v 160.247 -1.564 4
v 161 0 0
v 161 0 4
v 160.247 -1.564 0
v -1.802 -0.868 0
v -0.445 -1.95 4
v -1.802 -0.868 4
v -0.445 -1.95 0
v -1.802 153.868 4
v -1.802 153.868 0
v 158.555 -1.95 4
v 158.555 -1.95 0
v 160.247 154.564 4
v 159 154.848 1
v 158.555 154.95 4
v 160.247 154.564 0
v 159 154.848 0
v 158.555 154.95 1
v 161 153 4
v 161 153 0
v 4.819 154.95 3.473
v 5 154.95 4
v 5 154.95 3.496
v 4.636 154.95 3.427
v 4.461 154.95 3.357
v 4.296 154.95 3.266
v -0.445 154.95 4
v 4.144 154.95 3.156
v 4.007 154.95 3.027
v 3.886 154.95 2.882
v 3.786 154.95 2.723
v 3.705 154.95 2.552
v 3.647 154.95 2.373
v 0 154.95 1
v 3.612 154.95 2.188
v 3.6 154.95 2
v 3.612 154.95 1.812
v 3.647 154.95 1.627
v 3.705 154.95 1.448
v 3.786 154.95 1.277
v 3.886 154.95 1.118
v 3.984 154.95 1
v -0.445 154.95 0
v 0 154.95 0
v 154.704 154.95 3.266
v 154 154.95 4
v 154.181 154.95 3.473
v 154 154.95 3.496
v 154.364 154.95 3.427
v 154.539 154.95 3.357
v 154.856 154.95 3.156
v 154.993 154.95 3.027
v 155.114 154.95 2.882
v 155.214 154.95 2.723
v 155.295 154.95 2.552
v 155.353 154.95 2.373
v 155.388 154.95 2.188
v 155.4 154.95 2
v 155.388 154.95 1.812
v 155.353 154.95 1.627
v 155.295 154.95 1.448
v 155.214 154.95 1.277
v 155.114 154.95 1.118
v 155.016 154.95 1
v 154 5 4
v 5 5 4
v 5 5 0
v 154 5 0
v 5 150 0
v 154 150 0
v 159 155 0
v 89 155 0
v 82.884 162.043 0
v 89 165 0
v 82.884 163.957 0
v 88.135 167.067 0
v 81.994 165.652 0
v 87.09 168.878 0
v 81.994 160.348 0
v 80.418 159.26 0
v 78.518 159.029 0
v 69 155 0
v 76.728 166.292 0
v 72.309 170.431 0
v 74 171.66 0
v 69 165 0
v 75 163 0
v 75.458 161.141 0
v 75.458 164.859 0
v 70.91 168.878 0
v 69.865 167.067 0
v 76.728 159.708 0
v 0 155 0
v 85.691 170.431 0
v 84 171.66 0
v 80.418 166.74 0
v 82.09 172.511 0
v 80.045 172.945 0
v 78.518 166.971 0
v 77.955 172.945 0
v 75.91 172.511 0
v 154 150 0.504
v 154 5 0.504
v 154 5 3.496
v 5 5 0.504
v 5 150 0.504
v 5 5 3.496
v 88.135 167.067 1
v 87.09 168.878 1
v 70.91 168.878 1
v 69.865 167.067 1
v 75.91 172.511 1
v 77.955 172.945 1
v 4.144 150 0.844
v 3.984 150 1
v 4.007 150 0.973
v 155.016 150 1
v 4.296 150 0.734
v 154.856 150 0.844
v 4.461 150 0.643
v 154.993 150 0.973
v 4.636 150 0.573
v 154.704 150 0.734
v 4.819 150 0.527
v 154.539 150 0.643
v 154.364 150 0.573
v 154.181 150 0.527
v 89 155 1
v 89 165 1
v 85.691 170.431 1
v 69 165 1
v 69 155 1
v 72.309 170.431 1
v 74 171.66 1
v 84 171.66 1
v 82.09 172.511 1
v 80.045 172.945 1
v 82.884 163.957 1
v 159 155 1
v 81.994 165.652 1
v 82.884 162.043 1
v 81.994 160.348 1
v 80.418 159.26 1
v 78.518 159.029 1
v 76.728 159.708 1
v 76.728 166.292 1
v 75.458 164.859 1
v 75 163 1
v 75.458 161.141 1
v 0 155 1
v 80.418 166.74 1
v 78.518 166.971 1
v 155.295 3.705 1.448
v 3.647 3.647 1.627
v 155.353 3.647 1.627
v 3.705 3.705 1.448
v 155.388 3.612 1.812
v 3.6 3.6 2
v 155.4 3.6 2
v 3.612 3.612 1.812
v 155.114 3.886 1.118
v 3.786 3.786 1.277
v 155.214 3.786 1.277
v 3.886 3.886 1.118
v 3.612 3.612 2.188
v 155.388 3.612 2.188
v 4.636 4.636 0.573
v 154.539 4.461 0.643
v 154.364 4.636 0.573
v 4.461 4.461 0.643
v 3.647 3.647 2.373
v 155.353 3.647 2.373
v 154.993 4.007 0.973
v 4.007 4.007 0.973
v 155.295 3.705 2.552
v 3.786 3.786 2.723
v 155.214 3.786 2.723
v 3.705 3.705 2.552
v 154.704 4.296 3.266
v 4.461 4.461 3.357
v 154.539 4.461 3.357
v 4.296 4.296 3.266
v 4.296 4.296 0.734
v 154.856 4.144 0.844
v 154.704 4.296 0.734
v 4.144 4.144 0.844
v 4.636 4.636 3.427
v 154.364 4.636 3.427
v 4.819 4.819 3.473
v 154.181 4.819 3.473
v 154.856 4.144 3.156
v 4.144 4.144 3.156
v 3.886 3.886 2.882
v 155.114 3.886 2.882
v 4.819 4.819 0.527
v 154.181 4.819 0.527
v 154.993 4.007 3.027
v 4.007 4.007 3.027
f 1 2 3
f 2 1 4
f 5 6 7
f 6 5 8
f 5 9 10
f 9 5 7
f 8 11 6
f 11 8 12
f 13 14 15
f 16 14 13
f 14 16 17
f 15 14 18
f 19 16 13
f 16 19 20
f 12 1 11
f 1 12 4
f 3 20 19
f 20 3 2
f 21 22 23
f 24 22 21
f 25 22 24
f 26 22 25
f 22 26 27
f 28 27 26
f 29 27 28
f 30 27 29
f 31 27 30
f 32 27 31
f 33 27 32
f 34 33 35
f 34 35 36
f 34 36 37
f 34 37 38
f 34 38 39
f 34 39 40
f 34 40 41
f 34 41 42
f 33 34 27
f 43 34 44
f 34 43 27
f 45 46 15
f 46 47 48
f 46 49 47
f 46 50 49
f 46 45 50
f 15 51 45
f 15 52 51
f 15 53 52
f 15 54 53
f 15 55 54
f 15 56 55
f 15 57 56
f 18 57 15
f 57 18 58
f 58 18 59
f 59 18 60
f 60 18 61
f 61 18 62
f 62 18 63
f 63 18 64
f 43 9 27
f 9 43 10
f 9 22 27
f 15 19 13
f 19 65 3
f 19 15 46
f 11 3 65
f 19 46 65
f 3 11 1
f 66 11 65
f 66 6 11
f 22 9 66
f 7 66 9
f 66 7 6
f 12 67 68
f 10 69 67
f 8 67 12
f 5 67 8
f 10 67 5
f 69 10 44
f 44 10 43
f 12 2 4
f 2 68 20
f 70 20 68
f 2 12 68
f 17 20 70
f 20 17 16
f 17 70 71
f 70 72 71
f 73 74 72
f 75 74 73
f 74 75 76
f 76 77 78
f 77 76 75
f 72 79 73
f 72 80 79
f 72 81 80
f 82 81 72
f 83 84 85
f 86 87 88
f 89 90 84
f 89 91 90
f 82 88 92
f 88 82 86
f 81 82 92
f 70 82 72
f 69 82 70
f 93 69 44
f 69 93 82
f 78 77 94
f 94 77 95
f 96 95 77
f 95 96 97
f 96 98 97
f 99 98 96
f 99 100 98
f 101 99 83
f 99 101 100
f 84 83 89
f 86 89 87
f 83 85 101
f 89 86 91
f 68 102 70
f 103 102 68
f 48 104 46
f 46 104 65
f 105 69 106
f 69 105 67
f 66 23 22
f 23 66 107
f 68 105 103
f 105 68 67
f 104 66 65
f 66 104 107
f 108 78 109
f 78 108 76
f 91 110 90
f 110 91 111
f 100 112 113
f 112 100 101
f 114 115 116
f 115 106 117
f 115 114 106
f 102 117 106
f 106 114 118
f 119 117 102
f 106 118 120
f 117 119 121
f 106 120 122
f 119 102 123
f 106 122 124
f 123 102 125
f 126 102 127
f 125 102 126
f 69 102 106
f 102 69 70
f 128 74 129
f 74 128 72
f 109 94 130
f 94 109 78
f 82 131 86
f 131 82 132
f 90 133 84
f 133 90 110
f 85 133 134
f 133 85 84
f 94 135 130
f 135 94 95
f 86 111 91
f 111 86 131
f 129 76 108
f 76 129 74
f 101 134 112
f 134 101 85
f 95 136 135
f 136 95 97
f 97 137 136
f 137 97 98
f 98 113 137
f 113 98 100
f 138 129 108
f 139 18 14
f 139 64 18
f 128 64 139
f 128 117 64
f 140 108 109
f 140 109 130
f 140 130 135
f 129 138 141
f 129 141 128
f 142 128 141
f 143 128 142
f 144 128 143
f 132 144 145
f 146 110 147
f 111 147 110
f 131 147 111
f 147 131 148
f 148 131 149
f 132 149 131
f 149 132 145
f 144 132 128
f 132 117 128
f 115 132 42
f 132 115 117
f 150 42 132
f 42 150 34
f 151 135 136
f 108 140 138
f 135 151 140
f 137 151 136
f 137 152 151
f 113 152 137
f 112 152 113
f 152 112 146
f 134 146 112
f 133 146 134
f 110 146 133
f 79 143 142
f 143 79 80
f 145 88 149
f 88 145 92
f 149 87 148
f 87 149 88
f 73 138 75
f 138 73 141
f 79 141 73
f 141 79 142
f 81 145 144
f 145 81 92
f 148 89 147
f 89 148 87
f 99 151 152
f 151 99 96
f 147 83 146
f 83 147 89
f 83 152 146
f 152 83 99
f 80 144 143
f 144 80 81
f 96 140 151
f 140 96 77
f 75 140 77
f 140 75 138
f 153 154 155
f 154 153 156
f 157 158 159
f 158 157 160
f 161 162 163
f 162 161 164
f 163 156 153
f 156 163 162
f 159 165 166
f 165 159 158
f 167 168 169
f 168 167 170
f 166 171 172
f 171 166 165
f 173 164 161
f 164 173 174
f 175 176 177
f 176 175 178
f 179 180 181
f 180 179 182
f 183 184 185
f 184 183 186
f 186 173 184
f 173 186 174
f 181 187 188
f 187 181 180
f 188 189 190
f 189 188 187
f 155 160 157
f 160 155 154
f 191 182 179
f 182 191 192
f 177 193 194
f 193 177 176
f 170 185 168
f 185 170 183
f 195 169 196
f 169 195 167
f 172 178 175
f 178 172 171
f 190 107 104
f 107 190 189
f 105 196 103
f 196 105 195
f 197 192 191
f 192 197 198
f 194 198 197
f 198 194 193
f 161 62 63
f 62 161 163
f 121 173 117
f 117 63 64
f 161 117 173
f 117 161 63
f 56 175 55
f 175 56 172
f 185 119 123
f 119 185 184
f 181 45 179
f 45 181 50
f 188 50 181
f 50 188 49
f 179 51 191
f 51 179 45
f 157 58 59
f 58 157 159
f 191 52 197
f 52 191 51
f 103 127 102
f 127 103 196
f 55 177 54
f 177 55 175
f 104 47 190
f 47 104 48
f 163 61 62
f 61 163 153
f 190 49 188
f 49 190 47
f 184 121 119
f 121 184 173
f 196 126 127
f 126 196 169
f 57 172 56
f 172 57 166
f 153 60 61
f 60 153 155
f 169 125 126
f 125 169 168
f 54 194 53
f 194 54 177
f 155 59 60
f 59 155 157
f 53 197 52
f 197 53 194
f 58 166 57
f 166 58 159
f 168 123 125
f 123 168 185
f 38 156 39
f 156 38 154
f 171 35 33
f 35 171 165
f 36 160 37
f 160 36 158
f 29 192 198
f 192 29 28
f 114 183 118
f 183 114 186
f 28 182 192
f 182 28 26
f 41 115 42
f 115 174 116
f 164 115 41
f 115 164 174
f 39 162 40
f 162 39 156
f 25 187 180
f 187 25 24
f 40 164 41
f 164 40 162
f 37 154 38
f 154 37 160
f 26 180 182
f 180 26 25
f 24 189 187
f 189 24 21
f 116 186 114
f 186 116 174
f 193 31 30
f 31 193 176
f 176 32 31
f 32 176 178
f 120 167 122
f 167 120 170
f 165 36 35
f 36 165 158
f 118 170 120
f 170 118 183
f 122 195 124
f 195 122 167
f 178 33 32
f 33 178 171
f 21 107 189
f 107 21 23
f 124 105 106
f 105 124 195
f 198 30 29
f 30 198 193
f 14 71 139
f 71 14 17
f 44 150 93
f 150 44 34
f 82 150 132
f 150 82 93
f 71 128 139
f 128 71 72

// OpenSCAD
/********************************************************************************************************
P-Plate and L-Plate Holder v1.0 by Mike Thompson 3/1/2015, Thingiverse: mike_linus

The Plate Holder is designed to hold the standard 150mm x 150mm Australian L or P plates. 

The key advantage is the ability to slide the plate in and out without having to remove the mounting mechanism.  This is particularly handy when frequently changing plates between drivers.

The attachment locations and hole size are customisable for various suction cup or hook sizes and placements.
********************************************************************************************************/

/**************************************************************************
Enter the values corresponding to your tray requirements in this section
***************************************************************************/

/* [Attachment Options] */


//The radius of the attachment hole
sucker_hole_radius=4;
//Top Attachment
tsucker="include";//[include,exclude]
//Left Attachment
lsucker="exclude";//[include,exclude]
//Right Attachment
rsucker="exclude";//[include,exclude]
//Bottom Attachment
bsucker="exclude";//[include,exclude]

module holder()
{
	difference()
	{
		hull()
		{
			cylinder(r=2, h=4);
			translate([159,0,0])cylinder(r=2, h=4);
			translate([0,153,0])cylinder(r=2, h=4);
			translate([159,153,0])cylinder(r=2, h=4);
		}
		translate([5,5,0])cube([149,151,6]);	
	}
}

module sucker()
{
	difference()
	{	
		hull()
		{
			cylinder(r=10,h=1);
			translate([-10,-2,0])cube([20,15,1]);
		}
		cylinder(r=sucker_hole_radius,h=1);
	}
}

module slots()
{
	translate([5.1,158,2])rotate([90,180,0])cylinder(r=1.5,h=153,$fn=50);
	translate([5,5.1,2])rotate([0,90,0])rotate([0,0,-90])cylinder(r=1.5,h=149,$fn=50);
	translate([153.9,158,2])mirror(0,0,1)rotate([90,180,0])cylinder(r=1.5,h=153,$fn=50);
	intersection()
	{
		translate([4,5.1,2])rotate([0,90,0])rotate([0,0,-90])cylinder(r=1.5,h=152,$fn=50);
		translate([153.9,156,2])mirror(0,0,1)rotate([90,180,0])cylinder(r=1.5,h=153,$fn=50);
	}
	intersection()
	{
		translate([5.1,155,2])rotate([90,180,0])cylinder(r=1.5,h=152,$fn=50);
		translate([3,5.1,2])rotate([0,90,0])rotate([0,0,-90])cylinder(r=1.5,h=153,$fn=50);
	}

}

module build()
{
	difference()
	{
		union()
		{
			holder();
			if (bsucker=="include")
			{
				translate([79,-10,0])sucker();
			}
			if (rsucker=="include")
			{
				translate([169,141,0])rotate([0,0,90])sucker();
			}
			if (lsucker=="include")
			{
				translate([-10,141,0])rotate([0,0,-90])sucker();
			}
			if (tsucker=="include")
			{
				translate([79,163,0])rotate([0,0,180])sucker();
			}
		}
		slots();
	}
	translate([0,150,0])cube([159,5,1]);	
}

build();
